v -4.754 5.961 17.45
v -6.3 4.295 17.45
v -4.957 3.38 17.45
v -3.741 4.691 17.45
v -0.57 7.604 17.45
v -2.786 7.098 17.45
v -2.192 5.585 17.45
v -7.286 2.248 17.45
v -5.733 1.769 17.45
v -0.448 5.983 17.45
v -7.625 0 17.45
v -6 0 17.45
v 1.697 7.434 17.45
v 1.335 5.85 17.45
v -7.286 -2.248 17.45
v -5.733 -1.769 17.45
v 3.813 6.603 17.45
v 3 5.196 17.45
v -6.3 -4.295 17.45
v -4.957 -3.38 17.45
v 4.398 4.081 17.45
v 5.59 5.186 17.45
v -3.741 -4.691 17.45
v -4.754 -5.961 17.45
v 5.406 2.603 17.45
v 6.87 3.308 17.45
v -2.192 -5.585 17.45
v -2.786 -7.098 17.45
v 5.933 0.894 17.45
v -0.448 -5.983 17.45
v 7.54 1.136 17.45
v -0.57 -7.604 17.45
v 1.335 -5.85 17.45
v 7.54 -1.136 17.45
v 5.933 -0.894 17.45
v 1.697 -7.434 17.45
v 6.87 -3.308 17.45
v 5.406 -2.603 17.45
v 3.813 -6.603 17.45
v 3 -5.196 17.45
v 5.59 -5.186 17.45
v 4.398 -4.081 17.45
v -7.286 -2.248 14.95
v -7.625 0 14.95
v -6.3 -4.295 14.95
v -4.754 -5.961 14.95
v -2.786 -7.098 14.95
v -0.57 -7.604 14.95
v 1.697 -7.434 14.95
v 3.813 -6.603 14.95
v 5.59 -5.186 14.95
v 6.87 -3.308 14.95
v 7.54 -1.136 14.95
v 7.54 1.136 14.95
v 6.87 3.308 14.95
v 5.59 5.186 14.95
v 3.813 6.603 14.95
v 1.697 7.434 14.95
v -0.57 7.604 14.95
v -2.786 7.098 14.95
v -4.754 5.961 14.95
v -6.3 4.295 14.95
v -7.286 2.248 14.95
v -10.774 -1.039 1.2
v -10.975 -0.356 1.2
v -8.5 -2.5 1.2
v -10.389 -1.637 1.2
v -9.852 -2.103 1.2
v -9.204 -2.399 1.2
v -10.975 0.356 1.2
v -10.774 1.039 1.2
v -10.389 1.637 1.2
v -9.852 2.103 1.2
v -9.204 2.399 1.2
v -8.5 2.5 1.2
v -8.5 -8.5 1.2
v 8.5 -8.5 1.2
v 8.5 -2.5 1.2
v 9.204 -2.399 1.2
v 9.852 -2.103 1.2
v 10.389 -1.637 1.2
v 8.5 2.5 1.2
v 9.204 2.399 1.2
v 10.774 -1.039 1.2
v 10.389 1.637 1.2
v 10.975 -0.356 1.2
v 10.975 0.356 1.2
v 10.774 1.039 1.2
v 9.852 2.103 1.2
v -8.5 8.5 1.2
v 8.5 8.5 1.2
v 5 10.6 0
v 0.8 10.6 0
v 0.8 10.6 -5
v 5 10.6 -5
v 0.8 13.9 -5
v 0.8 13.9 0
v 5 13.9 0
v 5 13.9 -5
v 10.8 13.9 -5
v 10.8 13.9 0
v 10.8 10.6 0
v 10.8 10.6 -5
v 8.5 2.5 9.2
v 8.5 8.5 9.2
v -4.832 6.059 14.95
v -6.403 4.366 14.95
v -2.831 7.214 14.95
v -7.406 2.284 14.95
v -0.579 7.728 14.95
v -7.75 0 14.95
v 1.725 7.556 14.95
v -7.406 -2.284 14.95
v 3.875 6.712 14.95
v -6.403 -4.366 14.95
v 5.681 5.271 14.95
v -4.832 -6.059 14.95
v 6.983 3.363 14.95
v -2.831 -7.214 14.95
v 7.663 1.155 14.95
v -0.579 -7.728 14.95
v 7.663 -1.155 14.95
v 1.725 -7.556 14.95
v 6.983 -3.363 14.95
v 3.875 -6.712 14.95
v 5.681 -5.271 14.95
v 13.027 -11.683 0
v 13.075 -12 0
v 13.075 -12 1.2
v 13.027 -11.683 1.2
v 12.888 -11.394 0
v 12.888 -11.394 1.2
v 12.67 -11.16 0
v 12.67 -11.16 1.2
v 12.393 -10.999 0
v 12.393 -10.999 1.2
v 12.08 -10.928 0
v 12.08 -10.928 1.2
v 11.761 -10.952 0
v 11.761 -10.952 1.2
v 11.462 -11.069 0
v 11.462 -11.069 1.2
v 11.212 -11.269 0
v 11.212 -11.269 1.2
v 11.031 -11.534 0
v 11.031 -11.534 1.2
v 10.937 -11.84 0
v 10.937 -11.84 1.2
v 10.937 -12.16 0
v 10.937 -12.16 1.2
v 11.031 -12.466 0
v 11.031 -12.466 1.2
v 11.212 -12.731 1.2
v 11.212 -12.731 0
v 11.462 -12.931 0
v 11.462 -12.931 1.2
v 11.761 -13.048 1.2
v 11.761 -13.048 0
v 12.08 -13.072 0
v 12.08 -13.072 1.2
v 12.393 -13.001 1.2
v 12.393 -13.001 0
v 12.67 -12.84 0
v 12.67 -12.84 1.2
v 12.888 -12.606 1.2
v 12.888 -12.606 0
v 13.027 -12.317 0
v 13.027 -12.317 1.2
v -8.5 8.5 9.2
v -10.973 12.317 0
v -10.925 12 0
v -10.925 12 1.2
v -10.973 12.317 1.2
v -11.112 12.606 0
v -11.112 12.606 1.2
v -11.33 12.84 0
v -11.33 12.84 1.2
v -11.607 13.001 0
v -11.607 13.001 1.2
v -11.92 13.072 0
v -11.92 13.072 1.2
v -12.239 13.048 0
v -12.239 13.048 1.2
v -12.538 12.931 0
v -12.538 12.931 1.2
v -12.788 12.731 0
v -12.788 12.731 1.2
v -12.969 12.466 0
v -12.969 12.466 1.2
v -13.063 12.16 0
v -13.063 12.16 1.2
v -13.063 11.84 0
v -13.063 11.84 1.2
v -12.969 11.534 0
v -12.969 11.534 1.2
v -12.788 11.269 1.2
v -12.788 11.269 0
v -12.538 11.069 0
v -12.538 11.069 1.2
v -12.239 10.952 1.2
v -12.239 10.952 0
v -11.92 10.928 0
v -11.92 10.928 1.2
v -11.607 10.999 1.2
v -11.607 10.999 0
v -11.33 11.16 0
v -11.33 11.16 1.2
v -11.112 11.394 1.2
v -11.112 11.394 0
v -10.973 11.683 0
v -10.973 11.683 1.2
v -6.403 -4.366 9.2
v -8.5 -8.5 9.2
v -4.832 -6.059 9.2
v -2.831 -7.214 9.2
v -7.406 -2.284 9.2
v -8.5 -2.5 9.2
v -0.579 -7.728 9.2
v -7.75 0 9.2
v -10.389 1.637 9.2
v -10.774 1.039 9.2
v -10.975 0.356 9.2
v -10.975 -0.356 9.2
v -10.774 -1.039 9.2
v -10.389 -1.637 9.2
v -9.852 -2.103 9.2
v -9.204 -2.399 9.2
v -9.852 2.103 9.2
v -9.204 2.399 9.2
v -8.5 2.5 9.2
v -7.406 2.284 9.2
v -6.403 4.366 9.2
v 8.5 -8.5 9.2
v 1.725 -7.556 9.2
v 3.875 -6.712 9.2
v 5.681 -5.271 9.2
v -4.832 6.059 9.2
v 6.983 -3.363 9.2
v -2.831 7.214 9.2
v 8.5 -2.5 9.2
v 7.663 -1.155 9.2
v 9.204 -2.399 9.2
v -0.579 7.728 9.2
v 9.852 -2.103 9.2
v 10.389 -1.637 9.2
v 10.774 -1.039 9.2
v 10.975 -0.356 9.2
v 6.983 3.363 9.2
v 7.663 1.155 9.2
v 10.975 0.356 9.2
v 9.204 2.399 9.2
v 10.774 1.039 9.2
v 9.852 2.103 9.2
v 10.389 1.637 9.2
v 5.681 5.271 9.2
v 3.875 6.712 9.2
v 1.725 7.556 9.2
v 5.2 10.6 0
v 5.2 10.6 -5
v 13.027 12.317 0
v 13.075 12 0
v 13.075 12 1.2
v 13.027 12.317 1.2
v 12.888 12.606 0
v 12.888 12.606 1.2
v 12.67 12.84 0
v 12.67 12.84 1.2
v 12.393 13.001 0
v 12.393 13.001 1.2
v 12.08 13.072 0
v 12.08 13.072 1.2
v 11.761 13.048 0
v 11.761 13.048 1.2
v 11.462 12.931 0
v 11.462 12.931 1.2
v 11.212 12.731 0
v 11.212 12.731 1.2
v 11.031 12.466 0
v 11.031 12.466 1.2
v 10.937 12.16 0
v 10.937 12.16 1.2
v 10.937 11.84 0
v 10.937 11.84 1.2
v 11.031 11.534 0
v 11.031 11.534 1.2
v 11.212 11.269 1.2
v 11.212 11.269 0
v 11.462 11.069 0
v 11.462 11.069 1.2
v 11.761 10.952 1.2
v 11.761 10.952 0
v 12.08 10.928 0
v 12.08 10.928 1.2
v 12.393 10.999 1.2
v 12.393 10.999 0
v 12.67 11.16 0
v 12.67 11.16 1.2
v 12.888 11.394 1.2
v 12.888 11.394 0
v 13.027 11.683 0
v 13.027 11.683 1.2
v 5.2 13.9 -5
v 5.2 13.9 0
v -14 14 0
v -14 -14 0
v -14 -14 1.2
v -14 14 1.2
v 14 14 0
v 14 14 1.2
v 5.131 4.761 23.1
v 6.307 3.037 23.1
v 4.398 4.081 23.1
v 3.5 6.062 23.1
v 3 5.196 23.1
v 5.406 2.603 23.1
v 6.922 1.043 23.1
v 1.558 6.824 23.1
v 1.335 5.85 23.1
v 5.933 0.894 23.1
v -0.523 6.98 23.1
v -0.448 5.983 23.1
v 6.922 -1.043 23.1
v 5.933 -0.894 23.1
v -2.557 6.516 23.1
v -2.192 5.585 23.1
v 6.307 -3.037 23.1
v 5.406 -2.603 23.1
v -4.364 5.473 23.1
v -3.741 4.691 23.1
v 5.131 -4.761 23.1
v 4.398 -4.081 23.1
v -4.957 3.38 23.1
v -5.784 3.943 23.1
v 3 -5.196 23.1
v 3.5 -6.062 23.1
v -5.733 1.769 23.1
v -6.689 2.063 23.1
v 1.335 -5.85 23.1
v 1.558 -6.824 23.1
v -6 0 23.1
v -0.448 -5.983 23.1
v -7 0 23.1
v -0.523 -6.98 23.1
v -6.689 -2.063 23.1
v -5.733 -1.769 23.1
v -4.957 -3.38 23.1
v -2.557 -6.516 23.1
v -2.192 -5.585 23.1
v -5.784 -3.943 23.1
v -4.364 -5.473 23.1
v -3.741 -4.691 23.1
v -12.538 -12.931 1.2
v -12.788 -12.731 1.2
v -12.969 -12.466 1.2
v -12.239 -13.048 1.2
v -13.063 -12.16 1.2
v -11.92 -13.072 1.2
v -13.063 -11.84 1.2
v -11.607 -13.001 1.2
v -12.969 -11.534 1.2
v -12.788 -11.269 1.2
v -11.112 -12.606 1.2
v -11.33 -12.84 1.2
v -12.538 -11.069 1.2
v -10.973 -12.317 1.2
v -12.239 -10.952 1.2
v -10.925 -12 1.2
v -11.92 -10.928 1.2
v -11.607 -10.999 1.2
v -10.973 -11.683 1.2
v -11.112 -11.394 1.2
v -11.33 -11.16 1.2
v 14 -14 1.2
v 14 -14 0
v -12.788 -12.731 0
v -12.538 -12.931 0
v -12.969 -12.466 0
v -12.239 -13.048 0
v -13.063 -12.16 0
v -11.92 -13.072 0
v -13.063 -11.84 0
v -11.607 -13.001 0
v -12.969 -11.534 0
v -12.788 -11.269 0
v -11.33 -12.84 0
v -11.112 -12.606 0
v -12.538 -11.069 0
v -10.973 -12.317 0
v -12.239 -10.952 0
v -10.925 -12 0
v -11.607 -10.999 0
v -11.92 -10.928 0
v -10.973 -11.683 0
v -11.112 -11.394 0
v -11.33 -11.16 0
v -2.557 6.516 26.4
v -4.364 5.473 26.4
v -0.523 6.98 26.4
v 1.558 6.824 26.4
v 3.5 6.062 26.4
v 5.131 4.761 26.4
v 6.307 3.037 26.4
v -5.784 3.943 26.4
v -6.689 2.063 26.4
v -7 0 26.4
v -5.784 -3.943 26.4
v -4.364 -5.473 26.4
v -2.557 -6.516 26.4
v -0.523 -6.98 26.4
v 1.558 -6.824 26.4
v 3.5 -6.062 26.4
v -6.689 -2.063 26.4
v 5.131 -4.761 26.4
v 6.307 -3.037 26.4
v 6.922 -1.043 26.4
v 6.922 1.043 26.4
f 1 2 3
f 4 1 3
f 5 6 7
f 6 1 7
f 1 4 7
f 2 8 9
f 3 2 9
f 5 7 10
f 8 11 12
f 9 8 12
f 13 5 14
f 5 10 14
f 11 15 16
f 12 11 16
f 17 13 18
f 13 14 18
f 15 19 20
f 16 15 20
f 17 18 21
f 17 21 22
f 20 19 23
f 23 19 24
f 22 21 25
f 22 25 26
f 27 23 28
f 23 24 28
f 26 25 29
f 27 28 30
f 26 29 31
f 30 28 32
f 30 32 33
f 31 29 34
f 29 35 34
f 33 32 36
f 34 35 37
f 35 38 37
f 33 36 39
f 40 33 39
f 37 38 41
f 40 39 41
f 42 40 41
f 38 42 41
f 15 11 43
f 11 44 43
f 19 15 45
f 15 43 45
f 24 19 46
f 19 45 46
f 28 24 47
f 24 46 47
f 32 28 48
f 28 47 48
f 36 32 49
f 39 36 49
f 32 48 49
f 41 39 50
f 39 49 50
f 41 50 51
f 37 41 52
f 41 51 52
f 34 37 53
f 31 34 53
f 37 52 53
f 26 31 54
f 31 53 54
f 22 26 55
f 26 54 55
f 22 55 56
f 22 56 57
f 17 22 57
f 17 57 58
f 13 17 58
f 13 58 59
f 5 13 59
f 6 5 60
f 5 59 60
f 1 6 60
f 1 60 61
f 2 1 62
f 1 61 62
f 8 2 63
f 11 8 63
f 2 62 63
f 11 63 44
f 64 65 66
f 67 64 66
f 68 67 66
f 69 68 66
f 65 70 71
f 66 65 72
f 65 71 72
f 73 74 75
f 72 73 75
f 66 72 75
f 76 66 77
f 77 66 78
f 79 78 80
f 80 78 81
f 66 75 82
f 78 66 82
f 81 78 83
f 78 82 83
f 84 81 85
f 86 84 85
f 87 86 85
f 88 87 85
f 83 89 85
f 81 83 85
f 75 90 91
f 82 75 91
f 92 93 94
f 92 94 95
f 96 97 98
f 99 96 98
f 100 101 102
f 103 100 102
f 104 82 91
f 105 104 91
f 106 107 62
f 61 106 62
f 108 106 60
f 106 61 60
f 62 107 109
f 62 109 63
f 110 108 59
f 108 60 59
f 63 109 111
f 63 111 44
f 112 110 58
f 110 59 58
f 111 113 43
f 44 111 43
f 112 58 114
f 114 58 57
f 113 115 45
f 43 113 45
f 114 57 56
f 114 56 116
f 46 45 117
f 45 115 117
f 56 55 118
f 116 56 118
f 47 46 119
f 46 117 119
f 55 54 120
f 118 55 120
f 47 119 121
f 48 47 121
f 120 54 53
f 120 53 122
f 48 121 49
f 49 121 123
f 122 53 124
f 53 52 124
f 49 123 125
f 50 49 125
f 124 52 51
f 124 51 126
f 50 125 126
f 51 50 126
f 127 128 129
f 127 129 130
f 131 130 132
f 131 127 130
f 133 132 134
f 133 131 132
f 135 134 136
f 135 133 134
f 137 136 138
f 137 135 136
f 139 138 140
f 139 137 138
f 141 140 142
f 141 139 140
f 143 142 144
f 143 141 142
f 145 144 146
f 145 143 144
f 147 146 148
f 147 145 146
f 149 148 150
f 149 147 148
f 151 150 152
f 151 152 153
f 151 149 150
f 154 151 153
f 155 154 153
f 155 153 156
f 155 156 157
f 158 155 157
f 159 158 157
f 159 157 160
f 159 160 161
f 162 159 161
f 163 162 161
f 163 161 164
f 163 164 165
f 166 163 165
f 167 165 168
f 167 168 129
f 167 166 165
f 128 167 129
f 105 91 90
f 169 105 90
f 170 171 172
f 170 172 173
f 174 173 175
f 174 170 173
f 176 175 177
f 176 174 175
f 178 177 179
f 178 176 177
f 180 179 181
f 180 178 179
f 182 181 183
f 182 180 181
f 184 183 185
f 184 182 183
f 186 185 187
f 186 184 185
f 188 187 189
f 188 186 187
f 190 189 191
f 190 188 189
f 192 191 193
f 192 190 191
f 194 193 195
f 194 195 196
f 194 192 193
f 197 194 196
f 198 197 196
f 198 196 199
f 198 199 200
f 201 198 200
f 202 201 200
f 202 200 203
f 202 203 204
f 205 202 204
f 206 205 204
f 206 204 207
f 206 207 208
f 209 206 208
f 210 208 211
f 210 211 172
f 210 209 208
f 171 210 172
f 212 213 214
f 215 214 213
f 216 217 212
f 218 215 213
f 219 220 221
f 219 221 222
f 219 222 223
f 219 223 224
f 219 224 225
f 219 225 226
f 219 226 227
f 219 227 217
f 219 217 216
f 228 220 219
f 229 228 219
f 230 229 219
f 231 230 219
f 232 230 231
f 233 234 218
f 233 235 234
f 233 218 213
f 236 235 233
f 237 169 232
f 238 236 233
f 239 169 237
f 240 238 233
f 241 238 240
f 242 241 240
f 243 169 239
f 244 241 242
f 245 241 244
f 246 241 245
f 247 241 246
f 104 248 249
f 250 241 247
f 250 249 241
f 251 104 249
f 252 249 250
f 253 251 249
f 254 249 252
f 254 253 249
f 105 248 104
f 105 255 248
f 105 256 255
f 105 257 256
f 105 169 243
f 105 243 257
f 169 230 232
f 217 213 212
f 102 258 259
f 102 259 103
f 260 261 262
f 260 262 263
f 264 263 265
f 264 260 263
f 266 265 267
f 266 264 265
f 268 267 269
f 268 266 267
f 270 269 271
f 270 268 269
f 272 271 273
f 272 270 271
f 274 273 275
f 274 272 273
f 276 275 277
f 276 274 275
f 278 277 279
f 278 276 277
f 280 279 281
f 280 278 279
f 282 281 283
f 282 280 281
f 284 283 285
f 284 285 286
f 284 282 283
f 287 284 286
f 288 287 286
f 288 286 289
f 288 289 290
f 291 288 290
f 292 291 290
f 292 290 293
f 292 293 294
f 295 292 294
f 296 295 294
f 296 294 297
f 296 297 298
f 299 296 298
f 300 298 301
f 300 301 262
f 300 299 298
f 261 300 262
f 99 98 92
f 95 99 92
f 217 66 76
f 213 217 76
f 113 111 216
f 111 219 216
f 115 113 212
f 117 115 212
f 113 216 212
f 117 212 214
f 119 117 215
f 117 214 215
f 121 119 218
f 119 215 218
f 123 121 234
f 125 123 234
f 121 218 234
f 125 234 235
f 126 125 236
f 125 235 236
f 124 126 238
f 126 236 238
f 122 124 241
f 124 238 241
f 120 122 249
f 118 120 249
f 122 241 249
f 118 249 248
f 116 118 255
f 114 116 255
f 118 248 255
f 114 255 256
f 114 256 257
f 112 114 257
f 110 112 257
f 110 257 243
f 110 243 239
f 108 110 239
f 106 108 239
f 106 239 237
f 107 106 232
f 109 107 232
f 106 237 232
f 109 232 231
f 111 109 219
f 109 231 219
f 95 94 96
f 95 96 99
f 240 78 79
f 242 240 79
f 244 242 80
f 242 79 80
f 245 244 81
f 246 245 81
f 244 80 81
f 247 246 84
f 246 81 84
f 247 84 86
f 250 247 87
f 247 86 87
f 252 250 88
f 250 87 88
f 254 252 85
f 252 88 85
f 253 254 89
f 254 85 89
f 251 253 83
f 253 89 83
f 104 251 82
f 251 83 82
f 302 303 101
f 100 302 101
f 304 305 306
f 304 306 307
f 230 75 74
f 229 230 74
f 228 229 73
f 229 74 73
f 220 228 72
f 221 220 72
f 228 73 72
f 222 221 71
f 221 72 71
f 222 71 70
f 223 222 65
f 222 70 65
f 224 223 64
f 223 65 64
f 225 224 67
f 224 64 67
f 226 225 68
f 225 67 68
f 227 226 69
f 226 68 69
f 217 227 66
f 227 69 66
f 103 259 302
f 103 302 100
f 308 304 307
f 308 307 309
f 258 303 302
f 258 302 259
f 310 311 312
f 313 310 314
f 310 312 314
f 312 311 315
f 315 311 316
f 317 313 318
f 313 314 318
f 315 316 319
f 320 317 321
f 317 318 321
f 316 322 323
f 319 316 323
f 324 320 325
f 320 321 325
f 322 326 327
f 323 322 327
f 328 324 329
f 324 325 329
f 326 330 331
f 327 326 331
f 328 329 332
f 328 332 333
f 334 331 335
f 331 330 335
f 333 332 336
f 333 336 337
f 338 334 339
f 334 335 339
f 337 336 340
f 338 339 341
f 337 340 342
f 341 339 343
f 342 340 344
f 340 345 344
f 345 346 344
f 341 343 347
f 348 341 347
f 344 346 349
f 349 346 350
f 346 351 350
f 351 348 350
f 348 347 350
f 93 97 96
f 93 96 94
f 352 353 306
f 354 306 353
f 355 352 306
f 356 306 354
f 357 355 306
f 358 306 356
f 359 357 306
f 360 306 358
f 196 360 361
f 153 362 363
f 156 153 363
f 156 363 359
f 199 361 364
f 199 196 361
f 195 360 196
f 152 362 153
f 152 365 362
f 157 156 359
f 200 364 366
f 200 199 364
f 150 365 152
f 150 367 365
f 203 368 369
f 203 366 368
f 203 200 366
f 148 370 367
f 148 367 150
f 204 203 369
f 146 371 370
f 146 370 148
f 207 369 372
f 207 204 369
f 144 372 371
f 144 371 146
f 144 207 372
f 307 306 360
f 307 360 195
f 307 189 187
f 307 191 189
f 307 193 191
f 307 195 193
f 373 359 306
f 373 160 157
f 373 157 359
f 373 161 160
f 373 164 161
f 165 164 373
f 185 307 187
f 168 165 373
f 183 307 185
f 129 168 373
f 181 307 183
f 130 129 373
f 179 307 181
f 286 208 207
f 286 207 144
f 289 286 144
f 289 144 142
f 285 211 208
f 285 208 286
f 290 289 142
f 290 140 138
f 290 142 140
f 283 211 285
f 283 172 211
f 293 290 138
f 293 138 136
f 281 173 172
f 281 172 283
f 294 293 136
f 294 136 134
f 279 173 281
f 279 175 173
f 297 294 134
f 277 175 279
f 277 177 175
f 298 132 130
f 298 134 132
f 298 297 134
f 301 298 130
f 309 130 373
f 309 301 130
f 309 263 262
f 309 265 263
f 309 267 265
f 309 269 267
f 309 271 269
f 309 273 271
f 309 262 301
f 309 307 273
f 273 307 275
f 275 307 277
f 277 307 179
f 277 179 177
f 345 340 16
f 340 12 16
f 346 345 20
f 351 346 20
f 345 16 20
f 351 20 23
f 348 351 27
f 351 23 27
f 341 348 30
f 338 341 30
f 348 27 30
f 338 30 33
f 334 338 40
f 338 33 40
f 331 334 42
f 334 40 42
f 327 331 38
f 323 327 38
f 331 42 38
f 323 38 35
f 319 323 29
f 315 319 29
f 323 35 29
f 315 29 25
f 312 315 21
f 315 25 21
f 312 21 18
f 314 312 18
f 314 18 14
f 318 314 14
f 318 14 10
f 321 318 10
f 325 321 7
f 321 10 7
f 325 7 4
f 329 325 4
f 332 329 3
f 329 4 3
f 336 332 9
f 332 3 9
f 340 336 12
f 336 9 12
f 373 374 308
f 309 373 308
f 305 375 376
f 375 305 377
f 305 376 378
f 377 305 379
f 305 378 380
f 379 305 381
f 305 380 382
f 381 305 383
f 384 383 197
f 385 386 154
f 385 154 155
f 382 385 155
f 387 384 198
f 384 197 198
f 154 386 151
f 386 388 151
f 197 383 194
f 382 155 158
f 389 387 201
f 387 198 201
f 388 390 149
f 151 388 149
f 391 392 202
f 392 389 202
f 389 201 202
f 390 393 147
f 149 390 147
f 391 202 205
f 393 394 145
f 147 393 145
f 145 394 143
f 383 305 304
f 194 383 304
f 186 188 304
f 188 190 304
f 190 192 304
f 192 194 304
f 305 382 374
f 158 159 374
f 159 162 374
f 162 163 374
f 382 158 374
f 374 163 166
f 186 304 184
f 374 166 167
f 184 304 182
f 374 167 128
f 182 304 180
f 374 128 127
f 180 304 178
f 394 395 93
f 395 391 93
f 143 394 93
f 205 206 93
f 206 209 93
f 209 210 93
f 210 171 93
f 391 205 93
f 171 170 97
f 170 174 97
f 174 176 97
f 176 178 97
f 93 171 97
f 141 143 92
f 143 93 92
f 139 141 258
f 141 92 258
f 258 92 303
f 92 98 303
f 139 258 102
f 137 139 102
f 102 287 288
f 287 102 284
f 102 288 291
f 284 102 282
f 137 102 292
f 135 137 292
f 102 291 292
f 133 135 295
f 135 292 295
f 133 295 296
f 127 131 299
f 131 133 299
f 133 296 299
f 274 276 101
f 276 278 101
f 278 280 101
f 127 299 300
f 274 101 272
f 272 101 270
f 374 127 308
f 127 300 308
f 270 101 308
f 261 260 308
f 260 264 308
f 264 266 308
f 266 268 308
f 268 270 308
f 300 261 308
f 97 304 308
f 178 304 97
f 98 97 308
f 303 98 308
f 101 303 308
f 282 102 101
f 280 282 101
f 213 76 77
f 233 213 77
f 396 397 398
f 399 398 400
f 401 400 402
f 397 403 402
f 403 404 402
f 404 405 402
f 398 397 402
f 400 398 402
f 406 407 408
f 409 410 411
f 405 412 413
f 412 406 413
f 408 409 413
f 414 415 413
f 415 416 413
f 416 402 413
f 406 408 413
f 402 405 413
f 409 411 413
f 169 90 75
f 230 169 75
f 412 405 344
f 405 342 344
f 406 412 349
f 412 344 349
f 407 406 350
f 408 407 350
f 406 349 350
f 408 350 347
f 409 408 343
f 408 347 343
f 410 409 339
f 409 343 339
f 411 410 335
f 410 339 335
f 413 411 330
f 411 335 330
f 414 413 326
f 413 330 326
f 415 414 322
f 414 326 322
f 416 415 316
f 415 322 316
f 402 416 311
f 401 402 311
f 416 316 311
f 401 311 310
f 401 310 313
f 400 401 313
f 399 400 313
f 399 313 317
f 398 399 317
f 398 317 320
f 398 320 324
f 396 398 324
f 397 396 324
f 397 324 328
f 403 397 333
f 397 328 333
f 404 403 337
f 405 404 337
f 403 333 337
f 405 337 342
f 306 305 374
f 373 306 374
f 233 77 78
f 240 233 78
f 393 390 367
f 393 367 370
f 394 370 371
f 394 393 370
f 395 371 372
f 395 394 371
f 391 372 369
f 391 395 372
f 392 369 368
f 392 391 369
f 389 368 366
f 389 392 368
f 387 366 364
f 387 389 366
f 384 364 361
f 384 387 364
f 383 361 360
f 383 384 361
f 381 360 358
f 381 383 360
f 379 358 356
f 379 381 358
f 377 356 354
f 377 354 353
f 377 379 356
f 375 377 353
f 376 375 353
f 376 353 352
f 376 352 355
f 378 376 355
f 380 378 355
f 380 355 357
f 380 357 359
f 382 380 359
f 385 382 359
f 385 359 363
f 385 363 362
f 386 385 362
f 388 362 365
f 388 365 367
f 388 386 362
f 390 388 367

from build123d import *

# Parameters (mm, degrees)
F0_W     = 28
F0_H     = 28
F0_R     = 1.075
F1_DEPTH = 1.2
F3_DEPTH = 8
F6_W     = 4.2
F6_H     = 3.3
F6_W_2   = 5.6
F7_DEPTH = 5


with BuildPart() as f1:
    # F0 (on Top) → F1 (new body)
    with BuildSketch(Plane.XY):
        Rectangle(F0_W, F0_H)
        with Locations((-12, -12)):
            Circle(F0_R, mode=Mode.SUBTRACT)
        with Locations((12, -12)):
            Circle(F0_R, mode=Mode.SUBTRACT)
        with Locations((-12, 12)):
            Circle(F0_R, mode=Mode.SUBTRACT)
        with Locations((12, 12)):
            Circle(F0_R, mode=Mode.SUBTRACT)
    extrude(amount=F1_DEPTH)

    # F6 (on face) → F7 (join)
    with BuildSketch(Plane(origin=(0, 0, 0), x_dir=(1, 0, 0), z_dir=(0, 0, -1))):
        with Locations((2.9, -12.25)):
            Rectangle(F6_W, F6_H)
        with Locations((8, -12.25)):
            Rectangle(F6_W_2, F6_H)
    extrude(amount=F7_DEPTH)


with BuildPart() as f3:
    # F2 (on face) → F3 (new body)
    with BuildSketch(Plane.XY.offset(1.2)):
        with BuildLine():
            Line((8.5, 8.5), (-8.5, 8.5))
            Line((-8.5, 8.5), (-8.5, 2.5))
            ThreePointArc((-8.5, 2.5), (-11, 0), (-8.5, -2.5))
            Line((-8.5, -2.5), (-8.5, -8.5))
            Line((-8.5, -8.5), (8.5, -8.5))
            Line((8.5, -8.5), (8.5, -2.5))
            ThreePointArc((8.5, -2.5), (11, 0), (8.5, 2.5))
            Line((8.5, 2.5), (8.5, 8.5))
        make_face()
    extrude(amount=F3_DEPTH)

    # F4 (on Front) → F5 (revolve)
    with BuildSketch(Plane.XZ):
        Polygon((0, 9.2), (0, 26.4), (-7, 26.4), (-7, 23.1), (-6, 23.1), (-6, 17.45), (-7.625, 17.45), (-7.625, 14.95), (-7.75, 14.95), (-7.75, 9.2), align=None)
    revolve(axis=Axis((0, 0, 17.8), (0, 0, 1)))


solid = Compound([f1.part, f3.part])
